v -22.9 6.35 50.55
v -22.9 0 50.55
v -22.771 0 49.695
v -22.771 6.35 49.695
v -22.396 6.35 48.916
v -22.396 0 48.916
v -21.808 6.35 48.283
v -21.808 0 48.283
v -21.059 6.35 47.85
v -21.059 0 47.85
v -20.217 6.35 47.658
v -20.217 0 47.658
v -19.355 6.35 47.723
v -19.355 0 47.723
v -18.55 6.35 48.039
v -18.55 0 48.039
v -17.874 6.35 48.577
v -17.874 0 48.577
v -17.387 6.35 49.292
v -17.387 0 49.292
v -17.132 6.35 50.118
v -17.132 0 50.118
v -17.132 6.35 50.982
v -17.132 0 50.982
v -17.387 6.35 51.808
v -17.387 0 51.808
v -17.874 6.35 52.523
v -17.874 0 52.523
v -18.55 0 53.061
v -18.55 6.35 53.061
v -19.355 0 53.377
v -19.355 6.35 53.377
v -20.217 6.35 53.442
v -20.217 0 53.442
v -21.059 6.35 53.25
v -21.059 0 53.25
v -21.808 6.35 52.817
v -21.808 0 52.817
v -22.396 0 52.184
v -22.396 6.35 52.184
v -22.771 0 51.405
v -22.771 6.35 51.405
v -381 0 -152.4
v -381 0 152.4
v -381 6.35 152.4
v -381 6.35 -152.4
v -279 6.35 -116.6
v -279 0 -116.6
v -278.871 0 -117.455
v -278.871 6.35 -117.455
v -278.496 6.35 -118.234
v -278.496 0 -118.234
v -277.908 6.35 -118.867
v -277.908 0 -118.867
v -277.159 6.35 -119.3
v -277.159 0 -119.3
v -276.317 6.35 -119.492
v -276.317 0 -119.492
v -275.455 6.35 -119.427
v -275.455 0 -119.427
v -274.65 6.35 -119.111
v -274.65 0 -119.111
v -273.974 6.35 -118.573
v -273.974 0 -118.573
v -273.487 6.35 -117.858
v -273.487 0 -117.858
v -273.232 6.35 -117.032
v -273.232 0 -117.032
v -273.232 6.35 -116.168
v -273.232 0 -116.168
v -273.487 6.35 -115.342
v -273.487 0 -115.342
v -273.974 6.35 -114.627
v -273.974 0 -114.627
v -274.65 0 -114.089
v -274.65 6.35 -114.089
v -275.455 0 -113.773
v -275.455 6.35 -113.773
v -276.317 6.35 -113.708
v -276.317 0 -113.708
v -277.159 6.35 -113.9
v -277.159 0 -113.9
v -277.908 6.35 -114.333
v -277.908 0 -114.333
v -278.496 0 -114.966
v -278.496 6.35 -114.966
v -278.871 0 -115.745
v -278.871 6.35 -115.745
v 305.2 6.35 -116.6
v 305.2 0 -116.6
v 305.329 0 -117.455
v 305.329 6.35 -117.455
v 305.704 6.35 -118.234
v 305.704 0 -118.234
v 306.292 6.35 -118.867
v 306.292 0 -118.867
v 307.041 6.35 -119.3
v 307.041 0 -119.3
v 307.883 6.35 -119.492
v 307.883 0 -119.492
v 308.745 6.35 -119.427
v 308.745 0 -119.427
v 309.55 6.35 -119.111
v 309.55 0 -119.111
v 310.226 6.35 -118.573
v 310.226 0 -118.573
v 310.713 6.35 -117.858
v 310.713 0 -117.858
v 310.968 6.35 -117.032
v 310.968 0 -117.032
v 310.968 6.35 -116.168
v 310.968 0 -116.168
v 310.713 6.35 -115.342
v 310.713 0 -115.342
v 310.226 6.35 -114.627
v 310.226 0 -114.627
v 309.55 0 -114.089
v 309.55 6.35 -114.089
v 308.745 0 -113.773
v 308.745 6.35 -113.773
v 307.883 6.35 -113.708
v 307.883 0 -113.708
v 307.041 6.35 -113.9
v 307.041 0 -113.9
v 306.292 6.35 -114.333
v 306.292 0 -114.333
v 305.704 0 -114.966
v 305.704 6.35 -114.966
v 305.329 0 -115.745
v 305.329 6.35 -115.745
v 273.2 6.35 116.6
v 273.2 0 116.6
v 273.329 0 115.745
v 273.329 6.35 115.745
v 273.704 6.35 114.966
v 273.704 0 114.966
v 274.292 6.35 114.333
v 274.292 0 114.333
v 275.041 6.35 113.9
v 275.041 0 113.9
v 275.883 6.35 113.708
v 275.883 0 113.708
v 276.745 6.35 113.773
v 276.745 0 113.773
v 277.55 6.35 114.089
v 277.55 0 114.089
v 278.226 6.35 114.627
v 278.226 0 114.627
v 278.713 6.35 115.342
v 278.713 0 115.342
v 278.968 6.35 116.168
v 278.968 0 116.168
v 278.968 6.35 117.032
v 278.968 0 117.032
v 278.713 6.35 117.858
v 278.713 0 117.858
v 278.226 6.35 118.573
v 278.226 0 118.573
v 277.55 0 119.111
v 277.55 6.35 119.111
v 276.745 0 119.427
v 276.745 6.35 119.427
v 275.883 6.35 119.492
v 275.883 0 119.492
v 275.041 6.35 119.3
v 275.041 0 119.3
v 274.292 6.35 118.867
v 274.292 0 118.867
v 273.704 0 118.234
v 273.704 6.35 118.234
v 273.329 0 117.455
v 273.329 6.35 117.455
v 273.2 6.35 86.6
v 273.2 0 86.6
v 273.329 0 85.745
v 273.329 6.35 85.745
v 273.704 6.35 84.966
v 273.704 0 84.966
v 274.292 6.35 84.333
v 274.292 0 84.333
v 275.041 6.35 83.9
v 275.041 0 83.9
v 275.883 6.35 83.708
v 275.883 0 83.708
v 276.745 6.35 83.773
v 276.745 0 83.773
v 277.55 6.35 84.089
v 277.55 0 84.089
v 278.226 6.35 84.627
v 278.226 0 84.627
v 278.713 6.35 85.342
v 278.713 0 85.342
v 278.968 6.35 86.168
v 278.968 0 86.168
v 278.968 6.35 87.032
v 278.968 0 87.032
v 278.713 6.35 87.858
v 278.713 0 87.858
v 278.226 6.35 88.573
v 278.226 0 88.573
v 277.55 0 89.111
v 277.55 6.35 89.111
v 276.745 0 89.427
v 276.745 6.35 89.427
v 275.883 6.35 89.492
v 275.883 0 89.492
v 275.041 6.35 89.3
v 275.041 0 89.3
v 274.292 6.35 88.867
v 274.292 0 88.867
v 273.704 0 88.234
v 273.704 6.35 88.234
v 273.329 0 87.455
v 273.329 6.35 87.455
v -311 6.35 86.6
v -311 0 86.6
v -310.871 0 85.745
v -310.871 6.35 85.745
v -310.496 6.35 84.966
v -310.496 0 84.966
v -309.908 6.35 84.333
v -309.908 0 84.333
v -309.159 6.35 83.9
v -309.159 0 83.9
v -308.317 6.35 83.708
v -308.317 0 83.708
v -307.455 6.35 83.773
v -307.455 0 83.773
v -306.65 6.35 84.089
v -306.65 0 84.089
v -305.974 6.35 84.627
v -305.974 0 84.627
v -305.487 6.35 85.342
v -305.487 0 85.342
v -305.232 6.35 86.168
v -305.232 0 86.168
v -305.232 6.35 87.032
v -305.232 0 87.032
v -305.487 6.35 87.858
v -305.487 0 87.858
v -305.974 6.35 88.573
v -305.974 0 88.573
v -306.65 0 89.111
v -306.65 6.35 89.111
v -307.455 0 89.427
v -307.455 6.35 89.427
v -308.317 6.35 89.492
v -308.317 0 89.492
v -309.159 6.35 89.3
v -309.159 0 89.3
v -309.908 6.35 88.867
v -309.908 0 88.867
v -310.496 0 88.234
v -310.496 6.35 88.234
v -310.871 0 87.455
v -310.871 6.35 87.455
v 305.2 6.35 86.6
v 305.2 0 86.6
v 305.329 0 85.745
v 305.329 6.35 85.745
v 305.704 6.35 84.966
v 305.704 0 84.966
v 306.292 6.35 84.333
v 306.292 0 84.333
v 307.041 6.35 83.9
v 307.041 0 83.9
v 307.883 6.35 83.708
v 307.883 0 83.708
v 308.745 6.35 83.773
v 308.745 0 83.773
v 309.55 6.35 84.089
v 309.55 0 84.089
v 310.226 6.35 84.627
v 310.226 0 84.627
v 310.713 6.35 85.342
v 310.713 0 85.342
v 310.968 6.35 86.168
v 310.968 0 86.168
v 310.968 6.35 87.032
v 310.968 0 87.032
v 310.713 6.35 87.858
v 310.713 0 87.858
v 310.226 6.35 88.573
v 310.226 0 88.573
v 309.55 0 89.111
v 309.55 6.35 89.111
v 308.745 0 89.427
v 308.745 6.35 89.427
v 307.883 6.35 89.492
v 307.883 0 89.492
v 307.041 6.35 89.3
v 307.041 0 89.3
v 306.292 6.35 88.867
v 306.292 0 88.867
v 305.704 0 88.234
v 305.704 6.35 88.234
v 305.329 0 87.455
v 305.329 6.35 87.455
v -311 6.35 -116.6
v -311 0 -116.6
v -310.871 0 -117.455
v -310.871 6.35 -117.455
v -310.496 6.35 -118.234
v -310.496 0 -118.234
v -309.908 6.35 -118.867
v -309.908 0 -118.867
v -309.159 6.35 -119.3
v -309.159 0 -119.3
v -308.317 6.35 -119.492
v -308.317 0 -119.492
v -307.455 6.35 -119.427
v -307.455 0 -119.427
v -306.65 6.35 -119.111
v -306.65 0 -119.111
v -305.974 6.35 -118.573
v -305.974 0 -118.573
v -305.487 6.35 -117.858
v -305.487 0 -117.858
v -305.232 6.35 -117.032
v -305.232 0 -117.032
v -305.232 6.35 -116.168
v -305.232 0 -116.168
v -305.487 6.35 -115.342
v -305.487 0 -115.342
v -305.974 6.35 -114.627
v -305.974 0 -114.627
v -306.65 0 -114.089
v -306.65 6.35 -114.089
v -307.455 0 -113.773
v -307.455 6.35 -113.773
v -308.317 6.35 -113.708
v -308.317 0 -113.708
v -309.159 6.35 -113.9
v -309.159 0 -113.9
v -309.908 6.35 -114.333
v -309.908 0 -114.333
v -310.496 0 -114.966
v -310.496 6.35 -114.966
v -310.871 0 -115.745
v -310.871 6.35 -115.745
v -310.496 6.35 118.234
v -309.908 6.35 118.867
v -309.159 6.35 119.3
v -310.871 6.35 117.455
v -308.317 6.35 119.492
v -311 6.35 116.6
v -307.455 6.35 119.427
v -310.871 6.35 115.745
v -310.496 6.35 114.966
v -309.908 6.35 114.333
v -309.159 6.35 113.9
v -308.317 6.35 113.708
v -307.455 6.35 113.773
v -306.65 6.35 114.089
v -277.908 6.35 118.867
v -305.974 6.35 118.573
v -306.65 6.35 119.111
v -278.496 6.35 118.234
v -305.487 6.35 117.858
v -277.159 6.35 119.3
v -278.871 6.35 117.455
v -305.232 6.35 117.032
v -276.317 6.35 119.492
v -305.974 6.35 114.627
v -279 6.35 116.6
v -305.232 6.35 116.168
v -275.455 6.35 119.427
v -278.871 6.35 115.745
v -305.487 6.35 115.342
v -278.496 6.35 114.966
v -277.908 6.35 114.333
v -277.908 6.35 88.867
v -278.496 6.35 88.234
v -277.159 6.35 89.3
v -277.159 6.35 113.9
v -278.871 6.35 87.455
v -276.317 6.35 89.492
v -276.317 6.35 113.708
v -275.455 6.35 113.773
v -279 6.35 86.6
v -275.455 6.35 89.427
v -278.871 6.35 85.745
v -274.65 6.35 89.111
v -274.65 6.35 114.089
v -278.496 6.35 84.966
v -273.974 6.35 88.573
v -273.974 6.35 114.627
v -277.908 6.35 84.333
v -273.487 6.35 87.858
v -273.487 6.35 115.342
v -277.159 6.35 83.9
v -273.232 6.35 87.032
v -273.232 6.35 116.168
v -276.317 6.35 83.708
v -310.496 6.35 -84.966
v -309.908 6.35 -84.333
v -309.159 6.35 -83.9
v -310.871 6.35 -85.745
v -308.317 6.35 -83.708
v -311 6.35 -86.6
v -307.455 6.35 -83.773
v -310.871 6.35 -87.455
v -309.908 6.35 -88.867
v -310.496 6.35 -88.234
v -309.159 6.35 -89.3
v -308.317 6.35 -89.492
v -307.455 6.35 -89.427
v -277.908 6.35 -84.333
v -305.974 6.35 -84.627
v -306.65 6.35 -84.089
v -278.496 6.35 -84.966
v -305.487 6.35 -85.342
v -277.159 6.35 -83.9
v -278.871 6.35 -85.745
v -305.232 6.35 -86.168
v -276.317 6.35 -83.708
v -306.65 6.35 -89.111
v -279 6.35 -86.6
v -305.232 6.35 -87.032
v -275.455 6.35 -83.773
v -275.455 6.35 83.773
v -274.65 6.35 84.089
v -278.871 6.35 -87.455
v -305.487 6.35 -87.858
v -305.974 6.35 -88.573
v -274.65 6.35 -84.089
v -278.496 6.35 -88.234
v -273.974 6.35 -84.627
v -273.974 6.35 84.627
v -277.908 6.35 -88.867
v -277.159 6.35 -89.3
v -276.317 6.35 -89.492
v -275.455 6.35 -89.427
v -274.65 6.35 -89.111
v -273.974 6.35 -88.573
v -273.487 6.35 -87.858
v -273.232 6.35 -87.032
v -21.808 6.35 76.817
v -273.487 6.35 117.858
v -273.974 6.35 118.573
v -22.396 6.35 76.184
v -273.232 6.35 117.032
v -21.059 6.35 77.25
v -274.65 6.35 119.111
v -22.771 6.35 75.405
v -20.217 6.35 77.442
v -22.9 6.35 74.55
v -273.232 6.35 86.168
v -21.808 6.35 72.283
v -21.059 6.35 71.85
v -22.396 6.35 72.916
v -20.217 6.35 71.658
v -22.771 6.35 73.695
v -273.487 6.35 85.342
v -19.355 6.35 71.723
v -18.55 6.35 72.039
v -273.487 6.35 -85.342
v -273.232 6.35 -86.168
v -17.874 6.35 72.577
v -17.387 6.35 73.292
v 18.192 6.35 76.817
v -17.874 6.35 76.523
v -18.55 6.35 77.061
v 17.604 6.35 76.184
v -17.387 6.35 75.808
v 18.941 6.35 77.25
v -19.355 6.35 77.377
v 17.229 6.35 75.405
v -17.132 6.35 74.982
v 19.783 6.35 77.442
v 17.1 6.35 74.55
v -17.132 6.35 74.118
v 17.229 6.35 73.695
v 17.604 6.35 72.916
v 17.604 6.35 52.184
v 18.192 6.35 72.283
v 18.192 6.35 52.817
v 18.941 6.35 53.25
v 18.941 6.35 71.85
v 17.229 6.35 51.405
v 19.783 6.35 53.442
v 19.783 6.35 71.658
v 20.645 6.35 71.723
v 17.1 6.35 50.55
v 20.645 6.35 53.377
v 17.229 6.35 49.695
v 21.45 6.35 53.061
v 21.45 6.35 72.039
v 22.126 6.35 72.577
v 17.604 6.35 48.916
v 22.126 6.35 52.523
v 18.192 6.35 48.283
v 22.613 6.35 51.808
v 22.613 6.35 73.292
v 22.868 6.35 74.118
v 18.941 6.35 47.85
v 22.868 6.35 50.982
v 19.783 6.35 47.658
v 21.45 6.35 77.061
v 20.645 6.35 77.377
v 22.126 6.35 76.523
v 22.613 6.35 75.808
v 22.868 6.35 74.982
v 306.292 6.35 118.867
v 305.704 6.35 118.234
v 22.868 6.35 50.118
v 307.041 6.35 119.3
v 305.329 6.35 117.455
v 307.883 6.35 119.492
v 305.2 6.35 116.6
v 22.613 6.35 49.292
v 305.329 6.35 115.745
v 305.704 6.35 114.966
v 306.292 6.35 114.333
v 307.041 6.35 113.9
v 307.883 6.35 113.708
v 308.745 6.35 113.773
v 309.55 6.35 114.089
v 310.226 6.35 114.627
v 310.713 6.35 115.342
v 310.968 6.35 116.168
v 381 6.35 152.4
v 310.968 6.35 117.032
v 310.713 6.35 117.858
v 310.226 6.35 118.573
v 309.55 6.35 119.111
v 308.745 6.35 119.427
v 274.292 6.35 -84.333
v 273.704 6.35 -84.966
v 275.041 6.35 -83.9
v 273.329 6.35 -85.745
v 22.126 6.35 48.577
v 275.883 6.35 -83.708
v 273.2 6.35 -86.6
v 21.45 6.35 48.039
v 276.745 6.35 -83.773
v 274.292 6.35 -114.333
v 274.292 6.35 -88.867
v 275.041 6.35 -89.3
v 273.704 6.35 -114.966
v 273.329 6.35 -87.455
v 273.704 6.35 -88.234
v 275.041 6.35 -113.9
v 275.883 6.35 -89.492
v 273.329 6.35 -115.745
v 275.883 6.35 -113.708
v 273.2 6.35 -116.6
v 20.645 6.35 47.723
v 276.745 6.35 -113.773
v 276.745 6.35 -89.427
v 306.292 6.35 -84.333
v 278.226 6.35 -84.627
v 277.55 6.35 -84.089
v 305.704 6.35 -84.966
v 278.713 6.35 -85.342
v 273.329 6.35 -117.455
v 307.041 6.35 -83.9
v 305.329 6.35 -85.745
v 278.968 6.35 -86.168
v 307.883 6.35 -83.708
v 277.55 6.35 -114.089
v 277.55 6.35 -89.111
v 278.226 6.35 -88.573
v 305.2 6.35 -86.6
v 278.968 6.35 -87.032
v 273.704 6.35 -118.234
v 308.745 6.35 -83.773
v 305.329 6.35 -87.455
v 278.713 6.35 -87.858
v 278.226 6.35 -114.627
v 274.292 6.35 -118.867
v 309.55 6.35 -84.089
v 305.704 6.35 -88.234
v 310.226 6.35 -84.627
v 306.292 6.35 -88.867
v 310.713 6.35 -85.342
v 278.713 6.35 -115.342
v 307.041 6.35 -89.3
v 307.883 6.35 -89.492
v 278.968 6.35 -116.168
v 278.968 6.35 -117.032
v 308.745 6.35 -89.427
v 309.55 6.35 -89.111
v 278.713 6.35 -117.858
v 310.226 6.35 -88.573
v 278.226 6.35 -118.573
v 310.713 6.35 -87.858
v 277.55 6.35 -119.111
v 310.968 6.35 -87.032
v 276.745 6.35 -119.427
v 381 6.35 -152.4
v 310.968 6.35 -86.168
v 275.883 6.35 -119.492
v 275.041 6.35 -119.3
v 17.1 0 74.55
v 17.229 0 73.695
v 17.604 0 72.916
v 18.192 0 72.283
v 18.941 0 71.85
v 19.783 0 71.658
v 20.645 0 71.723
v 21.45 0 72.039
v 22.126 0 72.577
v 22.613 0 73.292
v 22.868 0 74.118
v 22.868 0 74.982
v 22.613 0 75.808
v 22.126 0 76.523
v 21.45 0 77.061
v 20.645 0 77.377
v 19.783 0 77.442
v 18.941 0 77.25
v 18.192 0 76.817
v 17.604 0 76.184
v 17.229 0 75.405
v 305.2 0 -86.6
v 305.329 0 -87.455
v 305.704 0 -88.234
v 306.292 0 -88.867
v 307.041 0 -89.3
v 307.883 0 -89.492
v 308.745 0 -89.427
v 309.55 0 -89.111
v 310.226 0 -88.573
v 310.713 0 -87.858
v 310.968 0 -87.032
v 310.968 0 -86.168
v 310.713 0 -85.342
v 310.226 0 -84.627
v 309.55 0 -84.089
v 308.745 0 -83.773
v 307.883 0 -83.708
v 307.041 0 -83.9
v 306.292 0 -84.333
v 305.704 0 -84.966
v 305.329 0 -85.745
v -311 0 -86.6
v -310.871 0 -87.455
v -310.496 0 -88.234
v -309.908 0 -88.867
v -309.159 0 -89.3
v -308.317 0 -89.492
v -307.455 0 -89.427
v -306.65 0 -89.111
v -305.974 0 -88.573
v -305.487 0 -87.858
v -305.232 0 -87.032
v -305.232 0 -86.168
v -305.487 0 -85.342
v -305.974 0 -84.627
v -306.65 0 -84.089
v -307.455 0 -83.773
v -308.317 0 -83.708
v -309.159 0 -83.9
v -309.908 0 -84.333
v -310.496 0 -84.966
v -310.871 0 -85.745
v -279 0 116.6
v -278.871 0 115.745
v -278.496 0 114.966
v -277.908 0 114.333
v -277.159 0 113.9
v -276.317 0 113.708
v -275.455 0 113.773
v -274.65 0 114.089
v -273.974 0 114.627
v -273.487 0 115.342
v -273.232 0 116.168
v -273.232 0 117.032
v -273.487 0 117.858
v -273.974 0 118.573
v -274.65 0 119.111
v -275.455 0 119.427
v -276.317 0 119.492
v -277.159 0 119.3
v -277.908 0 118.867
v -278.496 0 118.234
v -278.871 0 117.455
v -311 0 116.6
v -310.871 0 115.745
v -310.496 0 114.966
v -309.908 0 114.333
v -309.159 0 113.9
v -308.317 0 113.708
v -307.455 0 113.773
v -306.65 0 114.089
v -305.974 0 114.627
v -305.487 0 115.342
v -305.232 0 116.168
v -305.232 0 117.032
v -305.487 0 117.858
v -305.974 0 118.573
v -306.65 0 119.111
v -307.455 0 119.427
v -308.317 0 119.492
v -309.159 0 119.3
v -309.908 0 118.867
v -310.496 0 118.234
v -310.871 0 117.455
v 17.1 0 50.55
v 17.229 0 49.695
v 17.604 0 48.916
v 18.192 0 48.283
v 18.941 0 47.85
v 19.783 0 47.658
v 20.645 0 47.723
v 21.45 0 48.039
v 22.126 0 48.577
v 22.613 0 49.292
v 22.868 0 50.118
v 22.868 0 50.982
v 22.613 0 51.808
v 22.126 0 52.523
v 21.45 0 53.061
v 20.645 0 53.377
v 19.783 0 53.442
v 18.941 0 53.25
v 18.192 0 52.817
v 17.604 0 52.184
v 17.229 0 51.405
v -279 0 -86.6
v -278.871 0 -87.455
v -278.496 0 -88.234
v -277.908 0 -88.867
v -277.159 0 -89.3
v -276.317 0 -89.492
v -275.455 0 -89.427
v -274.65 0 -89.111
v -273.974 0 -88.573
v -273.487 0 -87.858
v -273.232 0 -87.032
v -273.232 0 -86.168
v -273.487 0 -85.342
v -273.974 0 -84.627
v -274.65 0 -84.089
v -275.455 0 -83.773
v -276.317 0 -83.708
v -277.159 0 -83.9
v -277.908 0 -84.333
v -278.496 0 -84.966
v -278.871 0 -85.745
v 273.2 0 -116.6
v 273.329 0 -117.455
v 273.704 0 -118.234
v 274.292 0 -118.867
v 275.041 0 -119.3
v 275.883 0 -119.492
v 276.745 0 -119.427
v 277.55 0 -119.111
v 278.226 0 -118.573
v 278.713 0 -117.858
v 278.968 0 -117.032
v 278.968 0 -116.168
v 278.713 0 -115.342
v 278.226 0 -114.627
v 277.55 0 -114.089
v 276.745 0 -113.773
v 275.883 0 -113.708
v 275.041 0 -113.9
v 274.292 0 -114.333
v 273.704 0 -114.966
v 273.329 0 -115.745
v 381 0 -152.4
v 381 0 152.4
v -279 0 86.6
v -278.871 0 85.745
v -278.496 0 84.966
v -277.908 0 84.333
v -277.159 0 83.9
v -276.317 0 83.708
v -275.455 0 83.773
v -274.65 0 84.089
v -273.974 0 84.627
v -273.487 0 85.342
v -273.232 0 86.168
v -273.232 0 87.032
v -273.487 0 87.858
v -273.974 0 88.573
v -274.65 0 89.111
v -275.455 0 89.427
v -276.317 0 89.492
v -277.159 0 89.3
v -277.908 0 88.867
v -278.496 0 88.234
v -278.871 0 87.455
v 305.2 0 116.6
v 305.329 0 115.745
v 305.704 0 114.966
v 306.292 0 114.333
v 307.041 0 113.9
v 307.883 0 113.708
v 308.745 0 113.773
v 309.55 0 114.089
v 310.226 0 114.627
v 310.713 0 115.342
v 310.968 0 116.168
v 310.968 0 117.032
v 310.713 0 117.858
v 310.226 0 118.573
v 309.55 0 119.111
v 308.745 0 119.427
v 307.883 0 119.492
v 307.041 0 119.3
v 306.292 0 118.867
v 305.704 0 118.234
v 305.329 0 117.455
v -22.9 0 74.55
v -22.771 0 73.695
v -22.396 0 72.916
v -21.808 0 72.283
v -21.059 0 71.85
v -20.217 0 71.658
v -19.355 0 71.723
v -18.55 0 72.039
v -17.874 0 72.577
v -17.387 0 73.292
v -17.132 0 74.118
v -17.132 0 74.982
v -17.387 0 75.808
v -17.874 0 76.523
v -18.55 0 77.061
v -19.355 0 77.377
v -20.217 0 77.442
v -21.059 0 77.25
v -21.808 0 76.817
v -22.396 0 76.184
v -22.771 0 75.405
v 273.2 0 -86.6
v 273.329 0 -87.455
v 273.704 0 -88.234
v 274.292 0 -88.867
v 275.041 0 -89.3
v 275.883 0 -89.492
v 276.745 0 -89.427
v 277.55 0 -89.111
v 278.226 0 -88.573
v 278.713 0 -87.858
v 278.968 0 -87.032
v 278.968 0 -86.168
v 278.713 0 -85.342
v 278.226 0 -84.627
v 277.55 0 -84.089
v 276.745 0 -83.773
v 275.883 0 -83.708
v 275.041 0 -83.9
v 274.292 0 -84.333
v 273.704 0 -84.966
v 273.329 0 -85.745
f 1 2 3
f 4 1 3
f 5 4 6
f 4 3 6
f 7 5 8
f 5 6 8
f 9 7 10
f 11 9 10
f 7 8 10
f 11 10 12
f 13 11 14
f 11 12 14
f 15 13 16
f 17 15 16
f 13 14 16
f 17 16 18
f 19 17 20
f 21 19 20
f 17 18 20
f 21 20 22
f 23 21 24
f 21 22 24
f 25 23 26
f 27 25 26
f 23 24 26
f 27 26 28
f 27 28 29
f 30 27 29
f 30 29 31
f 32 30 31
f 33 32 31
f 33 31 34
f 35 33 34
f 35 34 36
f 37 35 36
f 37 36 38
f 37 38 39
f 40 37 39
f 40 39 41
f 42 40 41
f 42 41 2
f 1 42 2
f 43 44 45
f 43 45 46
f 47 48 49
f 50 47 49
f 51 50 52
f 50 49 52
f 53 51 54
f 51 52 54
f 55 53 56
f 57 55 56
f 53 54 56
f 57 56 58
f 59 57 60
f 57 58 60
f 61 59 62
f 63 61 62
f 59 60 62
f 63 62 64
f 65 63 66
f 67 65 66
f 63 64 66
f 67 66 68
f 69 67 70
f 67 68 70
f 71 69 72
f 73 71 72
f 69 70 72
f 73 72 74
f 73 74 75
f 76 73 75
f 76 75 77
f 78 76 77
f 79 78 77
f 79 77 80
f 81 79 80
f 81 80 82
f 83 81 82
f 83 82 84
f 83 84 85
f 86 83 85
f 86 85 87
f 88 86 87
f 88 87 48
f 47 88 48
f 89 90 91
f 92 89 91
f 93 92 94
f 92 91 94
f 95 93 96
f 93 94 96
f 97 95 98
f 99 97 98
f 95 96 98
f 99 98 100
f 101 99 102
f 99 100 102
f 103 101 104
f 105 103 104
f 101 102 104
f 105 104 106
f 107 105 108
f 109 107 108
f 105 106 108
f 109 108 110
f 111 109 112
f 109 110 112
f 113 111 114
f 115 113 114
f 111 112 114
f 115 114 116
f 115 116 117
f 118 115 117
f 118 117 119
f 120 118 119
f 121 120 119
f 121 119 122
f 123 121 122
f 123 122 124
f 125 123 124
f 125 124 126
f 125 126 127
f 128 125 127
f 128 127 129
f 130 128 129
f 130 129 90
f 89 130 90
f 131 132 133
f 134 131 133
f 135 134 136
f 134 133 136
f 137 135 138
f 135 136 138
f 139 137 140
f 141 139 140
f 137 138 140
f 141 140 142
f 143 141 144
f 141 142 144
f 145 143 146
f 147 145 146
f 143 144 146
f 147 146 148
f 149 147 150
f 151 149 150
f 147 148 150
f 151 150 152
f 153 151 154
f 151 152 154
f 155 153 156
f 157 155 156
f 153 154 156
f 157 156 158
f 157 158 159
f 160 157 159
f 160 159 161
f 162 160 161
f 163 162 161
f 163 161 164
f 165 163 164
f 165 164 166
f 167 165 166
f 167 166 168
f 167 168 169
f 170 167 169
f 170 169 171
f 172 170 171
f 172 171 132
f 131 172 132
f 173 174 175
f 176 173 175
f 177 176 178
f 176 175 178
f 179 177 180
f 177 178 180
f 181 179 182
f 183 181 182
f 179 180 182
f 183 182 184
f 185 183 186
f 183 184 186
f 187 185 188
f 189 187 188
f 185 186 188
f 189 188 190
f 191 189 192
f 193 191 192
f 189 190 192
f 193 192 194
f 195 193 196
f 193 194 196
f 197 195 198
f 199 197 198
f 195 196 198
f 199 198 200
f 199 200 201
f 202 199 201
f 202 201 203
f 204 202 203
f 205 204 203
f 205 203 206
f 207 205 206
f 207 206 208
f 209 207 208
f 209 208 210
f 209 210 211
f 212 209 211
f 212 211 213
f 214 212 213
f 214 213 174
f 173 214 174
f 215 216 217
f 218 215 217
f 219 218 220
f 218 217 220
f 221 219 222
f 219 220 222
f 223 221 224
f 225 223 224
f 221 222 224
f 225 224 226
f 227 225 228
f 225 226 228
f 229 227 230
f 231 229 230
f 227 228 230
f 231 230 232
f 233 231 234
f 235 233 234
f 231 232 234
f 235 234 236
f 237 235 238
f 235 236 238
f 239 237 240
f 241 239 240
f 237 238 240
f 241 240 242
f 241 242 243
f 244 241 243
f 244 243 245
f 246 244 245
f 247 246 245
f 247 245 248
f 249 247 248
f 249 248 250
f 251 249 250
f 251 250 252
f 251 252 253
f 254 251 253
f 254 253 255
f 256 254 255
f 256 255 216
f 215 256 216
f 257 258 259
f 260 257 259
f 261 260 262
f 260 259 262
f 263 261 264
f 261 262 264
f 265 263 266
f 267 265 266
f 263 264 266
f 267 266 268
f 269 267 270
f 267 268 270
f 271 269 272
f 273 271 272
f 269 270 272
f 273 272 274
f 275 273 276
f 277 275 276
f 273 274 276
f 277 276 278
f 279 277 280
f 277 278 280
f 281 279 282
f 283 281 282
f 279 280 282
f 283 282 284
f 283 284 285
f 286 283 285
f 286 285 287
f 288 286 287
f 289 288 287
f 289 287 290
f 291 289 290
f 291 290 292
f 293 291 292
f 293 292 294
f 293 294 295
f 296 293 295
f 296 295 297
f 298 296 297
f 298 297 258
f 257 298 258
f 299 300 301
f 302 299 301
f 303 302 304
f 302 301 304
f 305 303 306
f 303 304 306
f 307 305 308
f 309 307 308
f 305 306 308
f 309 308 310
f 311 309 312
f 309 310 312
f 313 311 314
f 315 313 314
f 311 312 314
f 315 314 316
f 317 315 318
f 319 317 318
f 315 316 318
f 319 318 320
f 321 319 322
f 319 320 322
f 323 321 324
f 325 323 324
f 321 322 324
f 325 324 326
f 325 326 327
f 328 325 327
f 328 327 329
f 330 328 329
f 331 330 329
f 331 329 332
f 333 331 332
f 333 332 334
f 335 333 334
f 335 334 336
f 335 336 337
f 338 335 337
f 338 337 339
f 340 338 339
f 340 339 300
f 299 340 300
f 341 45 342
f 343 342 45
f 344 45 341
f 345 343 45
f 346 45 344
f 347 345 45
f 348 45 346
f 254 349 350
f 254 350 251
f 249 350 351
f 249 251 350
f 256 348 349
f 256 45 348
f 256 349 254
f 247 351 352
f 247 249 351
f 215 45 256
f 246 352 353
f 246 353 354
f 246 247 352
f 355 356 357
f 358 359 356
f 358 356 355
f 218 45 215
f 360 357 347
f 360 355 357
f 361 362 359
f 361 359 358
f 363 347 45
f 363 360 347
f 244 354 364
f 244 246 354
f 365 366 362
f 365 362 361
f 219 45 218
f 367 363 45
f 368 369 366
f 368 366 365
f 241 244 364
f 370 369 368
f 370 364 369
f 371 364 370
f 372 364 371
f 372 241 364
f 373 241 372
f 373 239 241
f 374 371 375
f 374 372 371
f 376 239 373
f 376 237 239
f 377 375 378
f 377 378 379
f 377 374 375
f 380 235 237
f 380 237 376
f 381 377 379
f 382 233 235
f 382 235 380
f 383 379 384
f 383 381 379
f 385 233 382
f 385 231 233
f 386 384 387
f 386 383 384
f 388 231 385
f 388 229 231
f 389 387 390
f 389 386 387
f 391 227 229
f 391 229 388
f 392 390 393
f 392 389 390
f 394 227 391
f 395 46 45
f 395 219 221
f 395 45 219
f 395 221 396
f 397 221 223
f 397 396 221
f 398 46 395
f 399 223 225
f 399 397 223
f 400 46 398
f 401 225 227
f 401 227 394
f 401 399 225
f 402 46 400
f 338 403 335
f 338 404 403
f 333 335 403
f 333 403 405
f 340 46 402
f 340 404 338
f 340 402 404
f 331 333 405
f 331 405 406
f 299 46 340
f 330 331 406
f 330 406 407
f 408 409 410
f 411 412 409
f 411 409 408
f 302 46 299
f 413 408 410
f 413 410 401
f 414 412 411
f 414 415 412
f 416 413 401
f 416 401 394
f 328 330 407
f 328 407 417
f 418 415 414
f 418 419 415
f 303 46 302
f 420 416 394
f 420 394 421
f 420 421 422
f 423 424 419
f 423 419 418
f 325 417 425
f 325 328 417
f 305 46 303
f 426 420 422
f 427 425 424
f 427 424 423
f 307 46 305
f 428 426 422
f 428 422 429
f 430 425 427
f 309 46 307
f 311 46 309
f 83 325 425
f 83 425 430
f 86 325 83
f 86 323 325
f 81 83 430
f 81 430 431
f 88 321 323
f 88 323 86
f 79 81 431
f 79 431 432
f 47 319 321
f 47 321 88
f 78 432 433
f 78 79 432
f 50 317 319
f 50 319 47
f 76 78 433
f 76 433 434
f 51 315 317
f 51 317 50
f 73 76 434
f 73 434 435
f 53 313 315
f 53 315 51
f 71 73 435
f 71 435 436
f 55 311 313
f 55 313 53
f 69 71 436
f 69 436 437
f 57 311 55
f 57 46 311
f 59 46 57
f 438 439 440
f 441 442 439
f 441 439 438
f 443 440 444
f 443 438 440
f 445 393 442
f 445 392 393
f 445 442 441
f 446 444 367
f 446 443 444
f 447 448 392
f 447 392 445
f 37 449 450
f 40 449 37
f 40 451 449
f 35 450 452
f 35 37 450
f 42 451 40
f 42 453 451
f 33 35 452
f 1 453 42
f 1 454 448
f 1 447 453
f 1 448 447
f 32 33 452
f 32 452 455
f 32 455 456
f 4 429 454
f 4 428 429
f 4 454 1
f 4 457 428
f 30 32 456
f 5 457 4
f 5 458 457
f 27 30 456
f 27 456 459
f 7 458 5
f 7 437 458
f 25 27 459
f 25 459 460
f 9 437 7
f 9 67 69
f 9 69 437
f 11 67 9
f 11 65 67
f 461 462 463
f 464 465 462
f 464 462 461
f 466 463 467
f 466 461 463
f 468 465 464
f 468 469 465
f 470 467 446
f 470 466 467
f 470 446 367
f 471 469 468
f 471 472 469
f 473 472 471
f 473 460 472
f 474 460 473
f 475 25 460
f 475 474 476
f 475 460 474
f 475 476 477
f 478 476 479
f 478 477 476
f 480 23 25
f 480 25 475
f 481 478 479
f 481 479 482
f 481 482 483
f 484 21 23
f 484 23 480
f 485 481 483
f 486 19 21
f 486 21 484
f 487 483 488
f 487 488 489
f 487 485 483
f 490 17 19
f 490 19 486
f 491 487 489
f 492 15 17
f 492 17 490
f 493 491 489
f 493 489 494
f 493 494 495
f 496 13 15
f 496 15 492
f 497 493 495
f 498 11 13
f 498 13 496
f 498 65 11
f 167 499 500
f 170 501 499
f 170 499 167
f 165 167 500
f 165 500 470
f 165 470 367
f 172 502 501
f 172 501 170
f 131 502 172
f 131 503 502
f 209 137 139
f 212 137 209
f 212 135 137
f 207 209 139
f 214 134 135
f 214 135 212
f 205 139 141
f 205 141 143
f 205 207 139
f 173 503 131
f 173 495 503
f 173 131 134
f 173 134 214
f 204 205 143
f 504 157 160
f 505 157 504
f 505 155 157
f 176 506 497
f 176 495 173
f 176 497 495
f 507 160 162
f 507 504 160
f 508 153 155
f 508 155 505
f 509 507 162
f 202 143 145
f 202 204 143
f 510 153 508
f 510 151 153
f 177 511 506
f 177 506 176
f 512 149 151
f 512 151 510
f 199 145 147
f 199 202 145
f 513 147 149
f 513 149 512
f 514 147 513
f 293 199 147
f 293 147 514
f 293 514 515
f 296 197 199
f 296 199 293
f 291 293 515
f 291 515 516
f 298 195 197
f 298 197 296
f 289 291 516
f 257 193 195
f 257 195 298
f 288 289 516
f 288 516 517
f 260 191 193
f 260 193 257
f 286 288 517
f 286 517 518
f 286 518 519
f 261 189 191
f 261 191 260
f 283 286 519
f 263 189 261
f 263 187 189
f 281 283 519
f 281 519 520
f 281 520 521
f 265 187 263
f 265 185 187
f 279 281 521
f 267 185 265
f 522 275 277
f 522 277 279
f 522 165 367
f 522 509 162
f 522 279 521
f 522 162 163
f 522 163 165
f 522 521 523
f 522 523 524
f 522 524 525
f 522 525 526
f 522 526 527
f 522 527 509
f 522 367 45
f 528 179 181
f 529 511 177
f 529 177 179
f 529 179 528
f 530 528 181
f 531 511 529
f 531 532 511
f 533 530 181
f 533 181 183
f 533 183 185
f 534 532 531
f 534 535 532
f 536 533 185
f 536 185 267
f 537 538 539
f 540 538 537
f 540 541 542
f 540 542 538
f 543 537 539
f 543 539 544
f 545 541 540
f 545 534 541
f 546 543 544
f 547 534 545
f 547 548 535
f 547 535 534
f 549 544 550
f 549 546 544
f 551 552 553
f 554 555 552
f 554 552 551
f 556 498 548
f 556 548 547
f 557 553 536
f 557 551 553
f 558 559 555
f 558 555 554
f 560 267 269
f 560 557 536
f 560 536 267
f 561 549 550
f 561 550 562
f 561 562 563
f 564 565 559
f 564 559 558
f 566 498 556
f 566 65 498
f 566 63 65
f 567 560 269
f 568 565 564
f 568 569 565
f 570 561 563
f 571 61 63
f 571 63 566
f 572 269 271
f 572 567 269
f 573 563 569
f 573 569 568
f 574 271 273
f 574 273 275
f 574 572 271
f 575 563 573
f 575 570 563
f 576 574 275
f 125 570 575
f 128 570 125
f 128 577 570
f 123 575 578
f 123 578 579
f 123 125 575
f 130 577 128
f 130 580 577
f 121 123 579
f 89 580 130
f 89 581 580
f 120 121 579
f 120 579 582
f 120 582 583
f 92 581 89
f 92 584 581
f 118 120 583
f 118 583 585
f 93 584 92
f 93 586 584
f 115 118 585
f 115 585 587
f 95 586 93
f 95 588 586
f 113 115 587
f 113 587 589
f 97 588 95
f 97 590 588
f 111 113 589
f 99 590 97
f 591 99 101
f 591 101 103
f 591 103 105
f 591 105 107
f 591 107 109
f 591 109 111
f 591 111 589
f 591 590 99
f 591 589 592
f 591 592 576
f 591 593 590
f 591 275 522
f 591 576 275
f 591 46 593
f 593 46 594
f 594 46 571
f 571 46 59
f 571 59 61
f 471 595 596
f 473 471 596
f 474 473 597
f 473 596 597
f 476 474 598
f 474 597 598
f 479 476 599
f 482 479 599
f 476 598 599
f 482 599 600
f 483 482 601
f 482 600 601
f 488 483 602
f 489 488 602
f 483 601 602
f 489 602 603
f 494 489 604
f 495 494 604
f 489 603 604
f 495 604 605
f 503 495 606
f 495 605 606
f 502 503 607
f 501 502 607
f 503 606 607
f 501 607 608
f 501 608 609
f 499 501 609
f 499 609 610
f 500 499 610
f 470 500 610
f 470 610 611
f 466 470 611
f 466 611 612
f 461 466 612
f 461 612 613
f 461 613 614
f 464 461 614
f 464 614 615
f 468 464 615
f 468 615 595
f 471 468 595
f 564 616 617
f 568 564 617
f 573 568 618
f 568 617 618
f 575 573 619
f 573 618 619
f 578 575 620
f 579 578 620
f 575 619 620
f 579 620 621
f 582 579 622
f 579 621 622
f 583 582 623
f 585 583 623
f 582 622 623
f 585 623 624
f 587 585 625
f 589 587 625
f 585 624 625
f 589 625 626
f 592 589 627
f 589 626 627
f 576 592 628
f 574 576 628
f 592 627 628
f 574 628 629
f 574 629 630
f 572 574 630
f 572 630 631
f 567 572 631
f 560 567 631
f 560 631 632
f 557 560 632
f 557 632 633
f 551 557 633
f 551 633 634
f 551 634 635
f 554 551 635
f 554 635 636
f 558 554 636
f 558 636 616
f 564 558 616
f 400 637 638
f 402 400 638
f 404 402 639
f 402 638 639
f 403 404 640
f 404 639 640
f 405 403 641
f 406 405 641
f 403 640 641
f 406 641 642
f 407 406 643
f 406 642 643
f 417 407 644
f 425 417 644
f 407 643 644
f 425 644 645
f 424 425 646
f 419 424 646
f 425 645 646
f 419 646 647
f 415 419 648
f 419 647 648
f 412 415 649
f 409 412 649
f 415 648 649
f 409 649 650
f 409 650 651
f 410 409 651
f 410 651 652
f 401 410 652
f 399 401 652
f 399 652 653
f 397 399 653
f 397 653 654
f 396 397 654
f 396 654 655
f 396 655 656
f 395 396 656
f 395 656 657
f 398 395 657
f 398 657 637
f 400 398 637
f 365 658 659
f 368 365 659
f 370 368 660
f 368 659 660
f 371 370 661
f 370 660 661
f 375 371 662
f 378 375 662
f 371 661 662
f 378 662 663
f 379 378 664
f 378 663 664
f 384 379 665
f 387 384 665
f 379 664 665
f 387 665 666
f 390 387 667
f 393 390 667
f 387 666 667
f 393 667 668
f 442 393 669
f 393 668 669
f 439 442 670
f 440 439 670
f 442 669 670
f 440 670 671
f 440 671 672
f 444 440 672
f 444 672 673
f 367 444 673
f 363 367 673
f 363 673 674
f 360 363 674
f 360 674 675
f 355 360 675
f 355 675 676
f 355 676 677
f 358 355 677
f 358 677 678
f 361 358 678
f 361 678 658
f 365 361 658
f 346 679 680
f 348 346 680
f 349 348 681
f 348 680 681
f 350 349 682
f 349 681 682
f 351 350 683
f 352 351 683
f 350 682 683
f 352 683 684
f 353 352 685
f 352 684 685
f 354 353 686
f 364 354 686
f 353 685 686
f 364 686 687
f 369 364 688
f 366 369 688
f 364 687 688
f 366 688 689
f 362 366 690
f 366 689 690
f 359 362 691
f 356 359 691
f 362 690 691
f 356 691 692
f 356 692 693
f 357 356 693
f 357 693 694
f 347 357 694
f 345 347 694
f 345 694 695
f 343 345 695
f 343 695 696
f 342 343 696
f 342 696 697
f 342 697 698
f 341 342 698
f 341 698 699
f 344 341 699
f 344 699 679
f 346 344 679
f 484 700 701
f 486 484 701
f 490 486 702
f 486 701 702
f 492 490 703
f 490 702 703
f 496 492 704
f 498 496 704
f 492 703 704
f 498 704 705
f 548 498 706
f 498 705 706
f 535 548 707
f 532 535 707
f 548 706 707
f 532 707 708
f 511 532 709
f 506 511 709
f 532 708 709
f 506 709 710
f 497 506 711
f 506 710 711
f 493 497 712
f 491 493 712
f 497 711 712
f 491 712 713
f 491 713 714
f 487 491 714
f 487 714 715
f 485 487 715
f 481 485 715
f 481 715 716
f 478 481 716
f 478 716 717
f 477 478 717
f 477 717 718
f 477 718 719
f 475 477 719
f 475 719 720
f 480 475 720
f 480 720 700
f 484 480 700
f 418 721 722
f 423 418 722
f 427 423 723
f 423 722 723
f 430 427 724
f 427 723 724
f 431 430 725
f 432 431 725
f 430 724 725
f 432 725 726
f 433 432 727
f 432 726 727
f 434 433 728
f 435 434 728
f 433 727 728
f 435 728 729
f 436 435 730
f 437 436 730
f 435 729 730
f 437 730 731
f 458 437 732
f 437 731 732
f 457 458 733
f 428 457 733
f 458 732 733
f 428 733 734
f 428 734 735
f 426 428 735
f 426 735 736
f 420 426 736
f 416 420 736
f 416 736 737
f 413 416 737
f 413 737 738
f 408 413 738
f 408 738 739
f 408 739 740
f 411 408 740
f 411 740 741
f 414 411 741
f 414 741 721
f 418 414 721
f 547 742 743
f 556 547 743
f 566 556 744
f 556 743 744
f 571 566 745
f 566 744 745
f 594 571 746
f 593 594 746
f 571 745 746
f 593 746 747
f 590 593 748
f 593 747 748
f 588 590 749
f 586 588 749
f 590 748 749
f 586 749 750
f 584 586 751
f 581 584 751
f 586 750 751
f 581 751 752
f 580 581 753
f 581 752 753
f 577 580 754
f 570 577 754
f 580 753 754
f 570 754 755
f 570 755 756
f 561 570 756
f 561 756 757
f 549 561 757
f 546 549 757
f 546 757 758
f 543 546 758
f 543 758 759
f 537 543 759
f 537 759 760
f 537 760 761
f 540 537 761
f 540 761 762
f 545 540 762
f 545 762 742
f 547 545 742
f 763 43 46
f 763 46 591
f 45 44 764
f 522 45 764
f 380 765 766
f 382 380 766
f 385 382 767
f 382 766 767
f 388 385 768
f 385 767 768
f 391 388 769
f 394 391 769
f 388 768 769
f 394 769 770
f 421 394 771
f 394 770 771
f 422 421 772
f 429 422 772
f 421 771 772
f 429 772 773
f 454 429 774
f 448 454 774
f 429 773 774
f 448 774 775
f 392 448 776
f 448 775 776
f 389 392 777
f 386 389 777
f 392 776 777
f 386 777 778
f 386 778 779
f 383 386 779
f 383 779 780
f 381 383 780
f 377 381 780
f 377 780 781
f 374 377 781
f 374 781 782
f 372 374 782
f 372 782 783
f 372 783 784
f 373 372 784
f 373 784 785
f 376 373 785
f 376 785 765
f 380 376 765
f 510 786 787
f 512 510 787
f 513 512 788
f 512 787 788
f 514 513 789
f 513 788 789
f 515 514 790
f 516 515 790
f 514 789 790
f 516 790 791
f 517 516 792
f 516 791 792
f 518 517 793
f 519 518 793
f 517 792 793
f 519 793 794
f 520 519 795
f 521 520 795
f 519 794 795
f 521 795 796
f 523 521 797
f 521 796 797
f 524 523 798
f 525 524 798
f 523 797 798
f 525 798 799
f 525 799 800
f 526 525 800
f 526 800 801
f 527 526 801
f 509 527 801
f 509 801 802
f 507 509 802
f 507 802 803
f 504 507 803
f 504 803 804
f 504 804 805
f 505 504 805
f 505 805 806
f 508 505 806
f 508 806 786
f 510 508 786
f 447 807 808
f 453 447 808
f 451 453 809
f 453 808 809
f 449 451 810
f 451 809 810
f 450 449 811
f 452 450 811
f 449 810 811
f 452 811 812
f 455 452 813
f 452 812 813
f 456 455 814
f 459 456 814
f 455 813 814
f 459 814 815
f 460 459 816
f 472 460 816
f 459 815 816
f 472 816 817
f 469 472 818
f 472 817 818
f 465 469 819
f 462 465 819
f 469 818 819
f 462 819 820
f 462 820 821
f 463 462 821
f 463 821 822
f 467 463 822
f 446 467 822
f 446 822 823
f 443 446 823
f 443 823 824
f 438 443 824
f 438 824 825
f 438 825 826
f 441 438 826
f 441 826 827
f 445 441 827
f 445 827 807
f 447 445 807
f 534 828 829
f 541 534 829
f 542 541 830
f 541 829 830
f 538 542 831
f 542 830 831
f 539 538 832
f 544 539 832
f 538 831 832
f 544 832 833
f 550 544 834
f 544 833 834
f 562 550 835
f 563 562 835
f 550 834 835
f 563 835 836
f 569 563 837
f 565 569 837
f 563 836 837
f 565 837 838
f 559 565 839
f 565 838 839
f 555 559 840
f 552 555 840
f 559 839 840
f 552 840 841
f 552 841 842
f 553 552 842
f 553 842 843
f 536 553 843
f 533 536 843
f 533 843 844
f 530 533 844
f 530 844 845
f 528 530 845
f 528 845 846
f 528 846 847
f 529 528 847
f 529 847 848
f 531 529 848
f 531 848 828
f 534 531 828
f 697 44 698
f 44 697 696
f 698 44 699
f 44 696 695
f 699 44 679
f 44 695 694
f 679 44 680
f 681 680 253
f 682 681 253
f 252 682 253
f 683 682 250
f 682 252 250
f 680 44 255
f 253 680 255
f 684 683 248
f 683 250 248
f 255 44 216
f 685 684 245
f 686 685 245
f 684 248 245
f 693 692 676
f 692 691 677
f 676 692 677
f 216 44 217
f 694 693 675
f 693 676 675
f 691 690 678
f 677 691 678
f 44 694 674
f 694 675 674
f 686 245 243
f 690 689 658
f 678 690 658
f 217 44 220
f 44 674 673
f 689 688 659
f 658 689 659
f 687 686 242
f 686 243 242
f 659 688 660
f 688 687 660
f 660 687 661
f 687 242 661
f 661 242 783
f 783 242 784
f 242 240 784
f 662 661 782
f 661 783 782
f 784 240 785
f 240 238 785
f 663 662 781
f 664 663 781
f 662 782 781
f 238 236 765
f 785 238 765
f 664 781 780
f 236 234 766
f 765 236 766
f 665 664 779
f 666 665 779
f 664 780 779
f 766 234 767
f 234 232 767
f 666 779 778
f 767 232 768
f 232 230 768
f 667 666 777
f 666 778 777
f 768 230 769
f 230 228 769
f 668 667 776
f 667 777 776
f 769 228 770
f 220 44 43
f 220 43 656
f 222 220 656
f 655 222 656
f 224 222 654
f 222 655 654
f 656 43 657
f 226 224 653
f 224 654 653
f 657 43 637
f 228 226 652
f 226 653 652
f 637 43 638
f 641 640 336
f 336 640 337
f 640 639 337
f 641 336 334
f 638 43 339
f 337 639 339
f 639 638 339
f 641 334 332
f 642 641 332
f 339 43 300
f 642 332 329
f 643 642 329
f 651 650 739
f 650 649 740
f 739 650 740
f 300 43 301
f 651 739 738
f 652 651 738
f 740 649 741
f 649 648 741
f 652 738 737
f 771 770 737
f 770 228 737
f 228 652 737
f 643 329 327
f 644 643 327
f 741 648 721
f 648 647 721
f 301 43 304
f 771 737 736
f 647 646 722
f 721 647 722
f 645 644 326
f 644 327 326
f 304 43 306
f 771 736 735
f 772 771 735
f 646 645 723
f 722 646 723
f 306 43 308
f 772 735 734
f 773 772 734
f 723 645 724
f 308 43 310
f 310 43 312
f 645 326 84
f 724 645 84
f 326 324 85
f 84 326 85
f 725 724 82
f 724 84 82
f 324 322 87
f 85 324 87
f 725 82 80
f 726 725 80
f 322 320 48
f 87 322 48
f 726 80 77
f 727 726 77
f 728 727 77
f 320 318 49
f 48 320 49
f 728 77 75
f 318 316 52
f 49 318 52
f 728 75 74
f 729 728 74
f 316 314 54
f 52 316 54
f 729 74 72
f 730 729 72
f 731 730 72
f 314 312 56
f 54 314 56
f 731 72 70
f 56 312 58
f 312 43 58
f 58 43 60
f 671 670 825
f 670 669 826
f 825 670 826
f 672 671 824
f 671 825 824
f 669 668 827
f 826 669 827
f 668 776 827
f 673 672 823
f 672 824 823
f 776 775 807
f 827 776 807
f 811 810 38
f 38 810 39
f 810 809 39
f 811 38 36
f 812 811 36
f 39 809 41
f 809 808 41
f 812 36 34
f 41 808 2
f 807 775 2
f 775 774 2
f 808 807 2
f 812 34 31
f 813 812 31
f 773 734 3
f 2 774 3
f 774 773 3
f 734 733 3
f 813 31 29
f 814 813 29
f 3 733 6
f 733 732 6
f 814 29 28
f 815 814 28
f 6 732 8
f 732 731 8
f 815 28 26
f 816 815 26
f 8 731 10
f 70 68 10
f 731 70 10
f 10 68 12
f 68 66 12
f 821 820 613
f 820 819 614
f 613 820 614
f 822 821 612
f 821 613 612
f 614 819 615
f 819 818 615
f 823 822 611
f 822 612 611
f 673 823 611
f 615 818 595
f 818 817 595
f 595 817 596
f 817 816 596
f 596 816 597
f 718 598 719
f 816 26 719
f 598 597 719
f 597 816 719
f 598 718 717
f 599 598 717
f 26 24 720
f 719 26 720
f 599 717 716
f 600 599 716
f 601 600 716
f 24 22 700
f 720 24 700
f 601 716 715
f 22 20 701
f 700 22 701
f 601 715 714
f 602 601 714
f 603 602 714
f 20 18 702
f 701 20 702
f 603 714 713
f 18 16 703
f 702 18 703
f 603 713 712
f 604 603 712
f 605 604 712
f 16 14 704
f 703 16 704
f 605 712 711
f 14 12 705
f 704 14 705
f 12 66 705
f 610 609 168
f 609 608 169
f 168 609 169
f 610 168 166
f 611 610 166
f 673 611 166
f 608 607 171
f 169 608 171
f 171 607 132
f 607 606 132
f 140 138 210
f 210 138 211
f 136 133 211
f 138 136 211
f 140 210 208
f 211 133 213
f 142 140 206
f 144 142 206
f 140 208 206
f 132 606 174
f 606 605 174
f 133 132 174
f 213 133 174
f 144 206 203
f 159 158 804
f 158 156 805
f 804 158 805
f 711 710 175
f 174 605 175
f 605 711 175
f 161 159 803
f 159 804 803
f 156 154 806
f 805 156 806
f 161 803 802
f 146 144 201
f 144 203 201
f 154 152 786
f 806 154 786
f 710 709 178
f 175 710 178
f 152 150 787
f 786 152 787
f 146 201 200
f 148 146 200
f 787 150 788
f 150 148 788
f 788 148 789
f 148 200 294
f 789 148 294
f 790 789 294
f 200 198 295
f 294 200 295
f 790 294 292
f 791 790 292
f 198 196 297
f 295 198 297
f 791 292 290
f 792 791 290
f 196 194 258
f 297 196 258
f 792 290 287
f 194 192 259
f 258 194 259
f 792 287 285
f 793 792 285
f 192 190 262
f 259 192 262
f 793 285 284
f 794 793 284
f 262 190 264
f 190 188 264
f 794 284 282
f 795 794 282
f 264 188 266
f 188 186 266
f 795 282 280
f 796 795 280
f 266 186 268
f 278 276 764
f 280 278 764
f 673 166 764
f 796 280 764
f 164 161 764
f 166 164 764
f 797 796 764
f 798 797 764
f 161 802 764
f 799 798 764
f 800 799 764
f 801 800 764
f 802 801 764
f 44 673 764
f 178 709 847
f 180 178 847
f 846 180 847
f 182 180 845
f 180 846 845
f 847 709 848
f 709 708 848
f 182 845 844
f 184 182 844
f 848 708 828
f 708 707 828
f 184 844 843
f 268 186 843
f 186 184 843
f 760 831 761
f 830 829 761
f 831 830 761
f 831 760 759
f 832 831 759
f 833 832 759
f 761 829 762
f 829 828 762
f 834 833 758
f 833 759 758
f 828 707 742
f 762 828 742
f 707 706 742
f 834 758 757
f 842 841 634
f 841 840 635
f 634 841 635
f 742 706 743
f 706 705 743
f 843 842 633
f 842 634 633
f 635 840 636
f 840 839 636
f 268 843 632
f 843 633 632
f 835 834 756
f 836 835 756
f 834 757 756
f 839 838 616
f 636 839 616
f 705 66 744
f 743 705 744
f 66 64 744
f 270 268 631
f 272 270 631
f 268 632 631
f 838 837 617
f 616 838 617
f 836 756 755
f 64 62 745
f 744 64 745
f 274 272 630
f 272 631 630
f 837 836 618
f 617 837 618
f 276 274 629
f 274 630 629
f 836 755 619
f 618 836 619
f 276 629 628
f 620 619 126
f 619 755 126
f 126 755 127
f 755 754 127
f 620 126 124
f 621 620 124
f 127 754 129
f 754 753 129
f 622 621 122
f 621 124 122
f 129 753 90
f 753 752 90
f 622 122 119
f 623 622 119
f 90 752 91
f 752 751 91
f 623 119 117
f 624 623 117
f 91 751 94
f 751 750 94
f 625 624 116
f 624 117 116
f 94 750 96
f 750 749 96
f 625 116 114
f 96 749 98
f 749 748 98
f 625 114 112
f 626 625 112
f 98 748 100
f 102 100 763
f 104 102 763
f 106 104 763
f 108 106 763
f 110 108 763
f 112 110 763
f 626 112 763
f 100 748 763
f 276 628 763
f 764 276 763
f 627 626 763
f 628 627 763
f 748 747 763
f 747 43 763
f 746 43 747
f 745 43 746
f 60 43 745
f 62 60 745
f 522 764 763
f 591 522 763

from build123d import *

# Parameters (mm, degrees)
SKETCH1_W                = 762
SKETCH1_H                = 304.8
BOSS_EXTRUDE1_DEPTH      = 6.35
M5_CLEARANCE_HOLE1_D     = 5.8
M5_CLEARANCE_HOLE1_DEPTH = 6.35


with BuildPart() as part:
    # Sketch1 → Boss-Extrude1 (new body)
    with BuildSketch(Plane(origin=(0, 0, 0), x_dir=(1, 0, 0), z_dir=(0, 1, 0))):
        Rectangle(SKETCH1_W, SKETCH1_H)
    extrude(amount=BOSS_EXTRUDE1_DEPTH)

    # M5 Clearance Hole1
    with Locations(Plane(origin=(0, 6.35, 0), x_dir=(1, 0, 0), z_dir=(0, 1, 0))):
        with Locations((276.100000001, 116.6), (276.100000001, 86.6), (308.100000001, 116.6), (308.100000001, 86.6), (276.100000001, -86.6), (276.100000001, -116.6), (308.100000001, -86.6), (308.100000001, -116.6), (-308.100000001, 116.6), (-308.100000001, 86.6), (-276.100000001, 116.6), (-276.100000001, 86.6), (-276.100000001, -86.6), (-276.100000001, -116.6), (-308.100000001, -116.6), (-308.100000001, -86.6), (20.000000025, -50.55), (20.000000025, -74.55), (-19.999999975, -74.55), (-19.999999975, -50.55)):
            Hole(M5_CLEARANCE_HOLE1_D / 2, depth=M5_CLEARANCE_HOLE1_DEPTH)


solid = part.part
